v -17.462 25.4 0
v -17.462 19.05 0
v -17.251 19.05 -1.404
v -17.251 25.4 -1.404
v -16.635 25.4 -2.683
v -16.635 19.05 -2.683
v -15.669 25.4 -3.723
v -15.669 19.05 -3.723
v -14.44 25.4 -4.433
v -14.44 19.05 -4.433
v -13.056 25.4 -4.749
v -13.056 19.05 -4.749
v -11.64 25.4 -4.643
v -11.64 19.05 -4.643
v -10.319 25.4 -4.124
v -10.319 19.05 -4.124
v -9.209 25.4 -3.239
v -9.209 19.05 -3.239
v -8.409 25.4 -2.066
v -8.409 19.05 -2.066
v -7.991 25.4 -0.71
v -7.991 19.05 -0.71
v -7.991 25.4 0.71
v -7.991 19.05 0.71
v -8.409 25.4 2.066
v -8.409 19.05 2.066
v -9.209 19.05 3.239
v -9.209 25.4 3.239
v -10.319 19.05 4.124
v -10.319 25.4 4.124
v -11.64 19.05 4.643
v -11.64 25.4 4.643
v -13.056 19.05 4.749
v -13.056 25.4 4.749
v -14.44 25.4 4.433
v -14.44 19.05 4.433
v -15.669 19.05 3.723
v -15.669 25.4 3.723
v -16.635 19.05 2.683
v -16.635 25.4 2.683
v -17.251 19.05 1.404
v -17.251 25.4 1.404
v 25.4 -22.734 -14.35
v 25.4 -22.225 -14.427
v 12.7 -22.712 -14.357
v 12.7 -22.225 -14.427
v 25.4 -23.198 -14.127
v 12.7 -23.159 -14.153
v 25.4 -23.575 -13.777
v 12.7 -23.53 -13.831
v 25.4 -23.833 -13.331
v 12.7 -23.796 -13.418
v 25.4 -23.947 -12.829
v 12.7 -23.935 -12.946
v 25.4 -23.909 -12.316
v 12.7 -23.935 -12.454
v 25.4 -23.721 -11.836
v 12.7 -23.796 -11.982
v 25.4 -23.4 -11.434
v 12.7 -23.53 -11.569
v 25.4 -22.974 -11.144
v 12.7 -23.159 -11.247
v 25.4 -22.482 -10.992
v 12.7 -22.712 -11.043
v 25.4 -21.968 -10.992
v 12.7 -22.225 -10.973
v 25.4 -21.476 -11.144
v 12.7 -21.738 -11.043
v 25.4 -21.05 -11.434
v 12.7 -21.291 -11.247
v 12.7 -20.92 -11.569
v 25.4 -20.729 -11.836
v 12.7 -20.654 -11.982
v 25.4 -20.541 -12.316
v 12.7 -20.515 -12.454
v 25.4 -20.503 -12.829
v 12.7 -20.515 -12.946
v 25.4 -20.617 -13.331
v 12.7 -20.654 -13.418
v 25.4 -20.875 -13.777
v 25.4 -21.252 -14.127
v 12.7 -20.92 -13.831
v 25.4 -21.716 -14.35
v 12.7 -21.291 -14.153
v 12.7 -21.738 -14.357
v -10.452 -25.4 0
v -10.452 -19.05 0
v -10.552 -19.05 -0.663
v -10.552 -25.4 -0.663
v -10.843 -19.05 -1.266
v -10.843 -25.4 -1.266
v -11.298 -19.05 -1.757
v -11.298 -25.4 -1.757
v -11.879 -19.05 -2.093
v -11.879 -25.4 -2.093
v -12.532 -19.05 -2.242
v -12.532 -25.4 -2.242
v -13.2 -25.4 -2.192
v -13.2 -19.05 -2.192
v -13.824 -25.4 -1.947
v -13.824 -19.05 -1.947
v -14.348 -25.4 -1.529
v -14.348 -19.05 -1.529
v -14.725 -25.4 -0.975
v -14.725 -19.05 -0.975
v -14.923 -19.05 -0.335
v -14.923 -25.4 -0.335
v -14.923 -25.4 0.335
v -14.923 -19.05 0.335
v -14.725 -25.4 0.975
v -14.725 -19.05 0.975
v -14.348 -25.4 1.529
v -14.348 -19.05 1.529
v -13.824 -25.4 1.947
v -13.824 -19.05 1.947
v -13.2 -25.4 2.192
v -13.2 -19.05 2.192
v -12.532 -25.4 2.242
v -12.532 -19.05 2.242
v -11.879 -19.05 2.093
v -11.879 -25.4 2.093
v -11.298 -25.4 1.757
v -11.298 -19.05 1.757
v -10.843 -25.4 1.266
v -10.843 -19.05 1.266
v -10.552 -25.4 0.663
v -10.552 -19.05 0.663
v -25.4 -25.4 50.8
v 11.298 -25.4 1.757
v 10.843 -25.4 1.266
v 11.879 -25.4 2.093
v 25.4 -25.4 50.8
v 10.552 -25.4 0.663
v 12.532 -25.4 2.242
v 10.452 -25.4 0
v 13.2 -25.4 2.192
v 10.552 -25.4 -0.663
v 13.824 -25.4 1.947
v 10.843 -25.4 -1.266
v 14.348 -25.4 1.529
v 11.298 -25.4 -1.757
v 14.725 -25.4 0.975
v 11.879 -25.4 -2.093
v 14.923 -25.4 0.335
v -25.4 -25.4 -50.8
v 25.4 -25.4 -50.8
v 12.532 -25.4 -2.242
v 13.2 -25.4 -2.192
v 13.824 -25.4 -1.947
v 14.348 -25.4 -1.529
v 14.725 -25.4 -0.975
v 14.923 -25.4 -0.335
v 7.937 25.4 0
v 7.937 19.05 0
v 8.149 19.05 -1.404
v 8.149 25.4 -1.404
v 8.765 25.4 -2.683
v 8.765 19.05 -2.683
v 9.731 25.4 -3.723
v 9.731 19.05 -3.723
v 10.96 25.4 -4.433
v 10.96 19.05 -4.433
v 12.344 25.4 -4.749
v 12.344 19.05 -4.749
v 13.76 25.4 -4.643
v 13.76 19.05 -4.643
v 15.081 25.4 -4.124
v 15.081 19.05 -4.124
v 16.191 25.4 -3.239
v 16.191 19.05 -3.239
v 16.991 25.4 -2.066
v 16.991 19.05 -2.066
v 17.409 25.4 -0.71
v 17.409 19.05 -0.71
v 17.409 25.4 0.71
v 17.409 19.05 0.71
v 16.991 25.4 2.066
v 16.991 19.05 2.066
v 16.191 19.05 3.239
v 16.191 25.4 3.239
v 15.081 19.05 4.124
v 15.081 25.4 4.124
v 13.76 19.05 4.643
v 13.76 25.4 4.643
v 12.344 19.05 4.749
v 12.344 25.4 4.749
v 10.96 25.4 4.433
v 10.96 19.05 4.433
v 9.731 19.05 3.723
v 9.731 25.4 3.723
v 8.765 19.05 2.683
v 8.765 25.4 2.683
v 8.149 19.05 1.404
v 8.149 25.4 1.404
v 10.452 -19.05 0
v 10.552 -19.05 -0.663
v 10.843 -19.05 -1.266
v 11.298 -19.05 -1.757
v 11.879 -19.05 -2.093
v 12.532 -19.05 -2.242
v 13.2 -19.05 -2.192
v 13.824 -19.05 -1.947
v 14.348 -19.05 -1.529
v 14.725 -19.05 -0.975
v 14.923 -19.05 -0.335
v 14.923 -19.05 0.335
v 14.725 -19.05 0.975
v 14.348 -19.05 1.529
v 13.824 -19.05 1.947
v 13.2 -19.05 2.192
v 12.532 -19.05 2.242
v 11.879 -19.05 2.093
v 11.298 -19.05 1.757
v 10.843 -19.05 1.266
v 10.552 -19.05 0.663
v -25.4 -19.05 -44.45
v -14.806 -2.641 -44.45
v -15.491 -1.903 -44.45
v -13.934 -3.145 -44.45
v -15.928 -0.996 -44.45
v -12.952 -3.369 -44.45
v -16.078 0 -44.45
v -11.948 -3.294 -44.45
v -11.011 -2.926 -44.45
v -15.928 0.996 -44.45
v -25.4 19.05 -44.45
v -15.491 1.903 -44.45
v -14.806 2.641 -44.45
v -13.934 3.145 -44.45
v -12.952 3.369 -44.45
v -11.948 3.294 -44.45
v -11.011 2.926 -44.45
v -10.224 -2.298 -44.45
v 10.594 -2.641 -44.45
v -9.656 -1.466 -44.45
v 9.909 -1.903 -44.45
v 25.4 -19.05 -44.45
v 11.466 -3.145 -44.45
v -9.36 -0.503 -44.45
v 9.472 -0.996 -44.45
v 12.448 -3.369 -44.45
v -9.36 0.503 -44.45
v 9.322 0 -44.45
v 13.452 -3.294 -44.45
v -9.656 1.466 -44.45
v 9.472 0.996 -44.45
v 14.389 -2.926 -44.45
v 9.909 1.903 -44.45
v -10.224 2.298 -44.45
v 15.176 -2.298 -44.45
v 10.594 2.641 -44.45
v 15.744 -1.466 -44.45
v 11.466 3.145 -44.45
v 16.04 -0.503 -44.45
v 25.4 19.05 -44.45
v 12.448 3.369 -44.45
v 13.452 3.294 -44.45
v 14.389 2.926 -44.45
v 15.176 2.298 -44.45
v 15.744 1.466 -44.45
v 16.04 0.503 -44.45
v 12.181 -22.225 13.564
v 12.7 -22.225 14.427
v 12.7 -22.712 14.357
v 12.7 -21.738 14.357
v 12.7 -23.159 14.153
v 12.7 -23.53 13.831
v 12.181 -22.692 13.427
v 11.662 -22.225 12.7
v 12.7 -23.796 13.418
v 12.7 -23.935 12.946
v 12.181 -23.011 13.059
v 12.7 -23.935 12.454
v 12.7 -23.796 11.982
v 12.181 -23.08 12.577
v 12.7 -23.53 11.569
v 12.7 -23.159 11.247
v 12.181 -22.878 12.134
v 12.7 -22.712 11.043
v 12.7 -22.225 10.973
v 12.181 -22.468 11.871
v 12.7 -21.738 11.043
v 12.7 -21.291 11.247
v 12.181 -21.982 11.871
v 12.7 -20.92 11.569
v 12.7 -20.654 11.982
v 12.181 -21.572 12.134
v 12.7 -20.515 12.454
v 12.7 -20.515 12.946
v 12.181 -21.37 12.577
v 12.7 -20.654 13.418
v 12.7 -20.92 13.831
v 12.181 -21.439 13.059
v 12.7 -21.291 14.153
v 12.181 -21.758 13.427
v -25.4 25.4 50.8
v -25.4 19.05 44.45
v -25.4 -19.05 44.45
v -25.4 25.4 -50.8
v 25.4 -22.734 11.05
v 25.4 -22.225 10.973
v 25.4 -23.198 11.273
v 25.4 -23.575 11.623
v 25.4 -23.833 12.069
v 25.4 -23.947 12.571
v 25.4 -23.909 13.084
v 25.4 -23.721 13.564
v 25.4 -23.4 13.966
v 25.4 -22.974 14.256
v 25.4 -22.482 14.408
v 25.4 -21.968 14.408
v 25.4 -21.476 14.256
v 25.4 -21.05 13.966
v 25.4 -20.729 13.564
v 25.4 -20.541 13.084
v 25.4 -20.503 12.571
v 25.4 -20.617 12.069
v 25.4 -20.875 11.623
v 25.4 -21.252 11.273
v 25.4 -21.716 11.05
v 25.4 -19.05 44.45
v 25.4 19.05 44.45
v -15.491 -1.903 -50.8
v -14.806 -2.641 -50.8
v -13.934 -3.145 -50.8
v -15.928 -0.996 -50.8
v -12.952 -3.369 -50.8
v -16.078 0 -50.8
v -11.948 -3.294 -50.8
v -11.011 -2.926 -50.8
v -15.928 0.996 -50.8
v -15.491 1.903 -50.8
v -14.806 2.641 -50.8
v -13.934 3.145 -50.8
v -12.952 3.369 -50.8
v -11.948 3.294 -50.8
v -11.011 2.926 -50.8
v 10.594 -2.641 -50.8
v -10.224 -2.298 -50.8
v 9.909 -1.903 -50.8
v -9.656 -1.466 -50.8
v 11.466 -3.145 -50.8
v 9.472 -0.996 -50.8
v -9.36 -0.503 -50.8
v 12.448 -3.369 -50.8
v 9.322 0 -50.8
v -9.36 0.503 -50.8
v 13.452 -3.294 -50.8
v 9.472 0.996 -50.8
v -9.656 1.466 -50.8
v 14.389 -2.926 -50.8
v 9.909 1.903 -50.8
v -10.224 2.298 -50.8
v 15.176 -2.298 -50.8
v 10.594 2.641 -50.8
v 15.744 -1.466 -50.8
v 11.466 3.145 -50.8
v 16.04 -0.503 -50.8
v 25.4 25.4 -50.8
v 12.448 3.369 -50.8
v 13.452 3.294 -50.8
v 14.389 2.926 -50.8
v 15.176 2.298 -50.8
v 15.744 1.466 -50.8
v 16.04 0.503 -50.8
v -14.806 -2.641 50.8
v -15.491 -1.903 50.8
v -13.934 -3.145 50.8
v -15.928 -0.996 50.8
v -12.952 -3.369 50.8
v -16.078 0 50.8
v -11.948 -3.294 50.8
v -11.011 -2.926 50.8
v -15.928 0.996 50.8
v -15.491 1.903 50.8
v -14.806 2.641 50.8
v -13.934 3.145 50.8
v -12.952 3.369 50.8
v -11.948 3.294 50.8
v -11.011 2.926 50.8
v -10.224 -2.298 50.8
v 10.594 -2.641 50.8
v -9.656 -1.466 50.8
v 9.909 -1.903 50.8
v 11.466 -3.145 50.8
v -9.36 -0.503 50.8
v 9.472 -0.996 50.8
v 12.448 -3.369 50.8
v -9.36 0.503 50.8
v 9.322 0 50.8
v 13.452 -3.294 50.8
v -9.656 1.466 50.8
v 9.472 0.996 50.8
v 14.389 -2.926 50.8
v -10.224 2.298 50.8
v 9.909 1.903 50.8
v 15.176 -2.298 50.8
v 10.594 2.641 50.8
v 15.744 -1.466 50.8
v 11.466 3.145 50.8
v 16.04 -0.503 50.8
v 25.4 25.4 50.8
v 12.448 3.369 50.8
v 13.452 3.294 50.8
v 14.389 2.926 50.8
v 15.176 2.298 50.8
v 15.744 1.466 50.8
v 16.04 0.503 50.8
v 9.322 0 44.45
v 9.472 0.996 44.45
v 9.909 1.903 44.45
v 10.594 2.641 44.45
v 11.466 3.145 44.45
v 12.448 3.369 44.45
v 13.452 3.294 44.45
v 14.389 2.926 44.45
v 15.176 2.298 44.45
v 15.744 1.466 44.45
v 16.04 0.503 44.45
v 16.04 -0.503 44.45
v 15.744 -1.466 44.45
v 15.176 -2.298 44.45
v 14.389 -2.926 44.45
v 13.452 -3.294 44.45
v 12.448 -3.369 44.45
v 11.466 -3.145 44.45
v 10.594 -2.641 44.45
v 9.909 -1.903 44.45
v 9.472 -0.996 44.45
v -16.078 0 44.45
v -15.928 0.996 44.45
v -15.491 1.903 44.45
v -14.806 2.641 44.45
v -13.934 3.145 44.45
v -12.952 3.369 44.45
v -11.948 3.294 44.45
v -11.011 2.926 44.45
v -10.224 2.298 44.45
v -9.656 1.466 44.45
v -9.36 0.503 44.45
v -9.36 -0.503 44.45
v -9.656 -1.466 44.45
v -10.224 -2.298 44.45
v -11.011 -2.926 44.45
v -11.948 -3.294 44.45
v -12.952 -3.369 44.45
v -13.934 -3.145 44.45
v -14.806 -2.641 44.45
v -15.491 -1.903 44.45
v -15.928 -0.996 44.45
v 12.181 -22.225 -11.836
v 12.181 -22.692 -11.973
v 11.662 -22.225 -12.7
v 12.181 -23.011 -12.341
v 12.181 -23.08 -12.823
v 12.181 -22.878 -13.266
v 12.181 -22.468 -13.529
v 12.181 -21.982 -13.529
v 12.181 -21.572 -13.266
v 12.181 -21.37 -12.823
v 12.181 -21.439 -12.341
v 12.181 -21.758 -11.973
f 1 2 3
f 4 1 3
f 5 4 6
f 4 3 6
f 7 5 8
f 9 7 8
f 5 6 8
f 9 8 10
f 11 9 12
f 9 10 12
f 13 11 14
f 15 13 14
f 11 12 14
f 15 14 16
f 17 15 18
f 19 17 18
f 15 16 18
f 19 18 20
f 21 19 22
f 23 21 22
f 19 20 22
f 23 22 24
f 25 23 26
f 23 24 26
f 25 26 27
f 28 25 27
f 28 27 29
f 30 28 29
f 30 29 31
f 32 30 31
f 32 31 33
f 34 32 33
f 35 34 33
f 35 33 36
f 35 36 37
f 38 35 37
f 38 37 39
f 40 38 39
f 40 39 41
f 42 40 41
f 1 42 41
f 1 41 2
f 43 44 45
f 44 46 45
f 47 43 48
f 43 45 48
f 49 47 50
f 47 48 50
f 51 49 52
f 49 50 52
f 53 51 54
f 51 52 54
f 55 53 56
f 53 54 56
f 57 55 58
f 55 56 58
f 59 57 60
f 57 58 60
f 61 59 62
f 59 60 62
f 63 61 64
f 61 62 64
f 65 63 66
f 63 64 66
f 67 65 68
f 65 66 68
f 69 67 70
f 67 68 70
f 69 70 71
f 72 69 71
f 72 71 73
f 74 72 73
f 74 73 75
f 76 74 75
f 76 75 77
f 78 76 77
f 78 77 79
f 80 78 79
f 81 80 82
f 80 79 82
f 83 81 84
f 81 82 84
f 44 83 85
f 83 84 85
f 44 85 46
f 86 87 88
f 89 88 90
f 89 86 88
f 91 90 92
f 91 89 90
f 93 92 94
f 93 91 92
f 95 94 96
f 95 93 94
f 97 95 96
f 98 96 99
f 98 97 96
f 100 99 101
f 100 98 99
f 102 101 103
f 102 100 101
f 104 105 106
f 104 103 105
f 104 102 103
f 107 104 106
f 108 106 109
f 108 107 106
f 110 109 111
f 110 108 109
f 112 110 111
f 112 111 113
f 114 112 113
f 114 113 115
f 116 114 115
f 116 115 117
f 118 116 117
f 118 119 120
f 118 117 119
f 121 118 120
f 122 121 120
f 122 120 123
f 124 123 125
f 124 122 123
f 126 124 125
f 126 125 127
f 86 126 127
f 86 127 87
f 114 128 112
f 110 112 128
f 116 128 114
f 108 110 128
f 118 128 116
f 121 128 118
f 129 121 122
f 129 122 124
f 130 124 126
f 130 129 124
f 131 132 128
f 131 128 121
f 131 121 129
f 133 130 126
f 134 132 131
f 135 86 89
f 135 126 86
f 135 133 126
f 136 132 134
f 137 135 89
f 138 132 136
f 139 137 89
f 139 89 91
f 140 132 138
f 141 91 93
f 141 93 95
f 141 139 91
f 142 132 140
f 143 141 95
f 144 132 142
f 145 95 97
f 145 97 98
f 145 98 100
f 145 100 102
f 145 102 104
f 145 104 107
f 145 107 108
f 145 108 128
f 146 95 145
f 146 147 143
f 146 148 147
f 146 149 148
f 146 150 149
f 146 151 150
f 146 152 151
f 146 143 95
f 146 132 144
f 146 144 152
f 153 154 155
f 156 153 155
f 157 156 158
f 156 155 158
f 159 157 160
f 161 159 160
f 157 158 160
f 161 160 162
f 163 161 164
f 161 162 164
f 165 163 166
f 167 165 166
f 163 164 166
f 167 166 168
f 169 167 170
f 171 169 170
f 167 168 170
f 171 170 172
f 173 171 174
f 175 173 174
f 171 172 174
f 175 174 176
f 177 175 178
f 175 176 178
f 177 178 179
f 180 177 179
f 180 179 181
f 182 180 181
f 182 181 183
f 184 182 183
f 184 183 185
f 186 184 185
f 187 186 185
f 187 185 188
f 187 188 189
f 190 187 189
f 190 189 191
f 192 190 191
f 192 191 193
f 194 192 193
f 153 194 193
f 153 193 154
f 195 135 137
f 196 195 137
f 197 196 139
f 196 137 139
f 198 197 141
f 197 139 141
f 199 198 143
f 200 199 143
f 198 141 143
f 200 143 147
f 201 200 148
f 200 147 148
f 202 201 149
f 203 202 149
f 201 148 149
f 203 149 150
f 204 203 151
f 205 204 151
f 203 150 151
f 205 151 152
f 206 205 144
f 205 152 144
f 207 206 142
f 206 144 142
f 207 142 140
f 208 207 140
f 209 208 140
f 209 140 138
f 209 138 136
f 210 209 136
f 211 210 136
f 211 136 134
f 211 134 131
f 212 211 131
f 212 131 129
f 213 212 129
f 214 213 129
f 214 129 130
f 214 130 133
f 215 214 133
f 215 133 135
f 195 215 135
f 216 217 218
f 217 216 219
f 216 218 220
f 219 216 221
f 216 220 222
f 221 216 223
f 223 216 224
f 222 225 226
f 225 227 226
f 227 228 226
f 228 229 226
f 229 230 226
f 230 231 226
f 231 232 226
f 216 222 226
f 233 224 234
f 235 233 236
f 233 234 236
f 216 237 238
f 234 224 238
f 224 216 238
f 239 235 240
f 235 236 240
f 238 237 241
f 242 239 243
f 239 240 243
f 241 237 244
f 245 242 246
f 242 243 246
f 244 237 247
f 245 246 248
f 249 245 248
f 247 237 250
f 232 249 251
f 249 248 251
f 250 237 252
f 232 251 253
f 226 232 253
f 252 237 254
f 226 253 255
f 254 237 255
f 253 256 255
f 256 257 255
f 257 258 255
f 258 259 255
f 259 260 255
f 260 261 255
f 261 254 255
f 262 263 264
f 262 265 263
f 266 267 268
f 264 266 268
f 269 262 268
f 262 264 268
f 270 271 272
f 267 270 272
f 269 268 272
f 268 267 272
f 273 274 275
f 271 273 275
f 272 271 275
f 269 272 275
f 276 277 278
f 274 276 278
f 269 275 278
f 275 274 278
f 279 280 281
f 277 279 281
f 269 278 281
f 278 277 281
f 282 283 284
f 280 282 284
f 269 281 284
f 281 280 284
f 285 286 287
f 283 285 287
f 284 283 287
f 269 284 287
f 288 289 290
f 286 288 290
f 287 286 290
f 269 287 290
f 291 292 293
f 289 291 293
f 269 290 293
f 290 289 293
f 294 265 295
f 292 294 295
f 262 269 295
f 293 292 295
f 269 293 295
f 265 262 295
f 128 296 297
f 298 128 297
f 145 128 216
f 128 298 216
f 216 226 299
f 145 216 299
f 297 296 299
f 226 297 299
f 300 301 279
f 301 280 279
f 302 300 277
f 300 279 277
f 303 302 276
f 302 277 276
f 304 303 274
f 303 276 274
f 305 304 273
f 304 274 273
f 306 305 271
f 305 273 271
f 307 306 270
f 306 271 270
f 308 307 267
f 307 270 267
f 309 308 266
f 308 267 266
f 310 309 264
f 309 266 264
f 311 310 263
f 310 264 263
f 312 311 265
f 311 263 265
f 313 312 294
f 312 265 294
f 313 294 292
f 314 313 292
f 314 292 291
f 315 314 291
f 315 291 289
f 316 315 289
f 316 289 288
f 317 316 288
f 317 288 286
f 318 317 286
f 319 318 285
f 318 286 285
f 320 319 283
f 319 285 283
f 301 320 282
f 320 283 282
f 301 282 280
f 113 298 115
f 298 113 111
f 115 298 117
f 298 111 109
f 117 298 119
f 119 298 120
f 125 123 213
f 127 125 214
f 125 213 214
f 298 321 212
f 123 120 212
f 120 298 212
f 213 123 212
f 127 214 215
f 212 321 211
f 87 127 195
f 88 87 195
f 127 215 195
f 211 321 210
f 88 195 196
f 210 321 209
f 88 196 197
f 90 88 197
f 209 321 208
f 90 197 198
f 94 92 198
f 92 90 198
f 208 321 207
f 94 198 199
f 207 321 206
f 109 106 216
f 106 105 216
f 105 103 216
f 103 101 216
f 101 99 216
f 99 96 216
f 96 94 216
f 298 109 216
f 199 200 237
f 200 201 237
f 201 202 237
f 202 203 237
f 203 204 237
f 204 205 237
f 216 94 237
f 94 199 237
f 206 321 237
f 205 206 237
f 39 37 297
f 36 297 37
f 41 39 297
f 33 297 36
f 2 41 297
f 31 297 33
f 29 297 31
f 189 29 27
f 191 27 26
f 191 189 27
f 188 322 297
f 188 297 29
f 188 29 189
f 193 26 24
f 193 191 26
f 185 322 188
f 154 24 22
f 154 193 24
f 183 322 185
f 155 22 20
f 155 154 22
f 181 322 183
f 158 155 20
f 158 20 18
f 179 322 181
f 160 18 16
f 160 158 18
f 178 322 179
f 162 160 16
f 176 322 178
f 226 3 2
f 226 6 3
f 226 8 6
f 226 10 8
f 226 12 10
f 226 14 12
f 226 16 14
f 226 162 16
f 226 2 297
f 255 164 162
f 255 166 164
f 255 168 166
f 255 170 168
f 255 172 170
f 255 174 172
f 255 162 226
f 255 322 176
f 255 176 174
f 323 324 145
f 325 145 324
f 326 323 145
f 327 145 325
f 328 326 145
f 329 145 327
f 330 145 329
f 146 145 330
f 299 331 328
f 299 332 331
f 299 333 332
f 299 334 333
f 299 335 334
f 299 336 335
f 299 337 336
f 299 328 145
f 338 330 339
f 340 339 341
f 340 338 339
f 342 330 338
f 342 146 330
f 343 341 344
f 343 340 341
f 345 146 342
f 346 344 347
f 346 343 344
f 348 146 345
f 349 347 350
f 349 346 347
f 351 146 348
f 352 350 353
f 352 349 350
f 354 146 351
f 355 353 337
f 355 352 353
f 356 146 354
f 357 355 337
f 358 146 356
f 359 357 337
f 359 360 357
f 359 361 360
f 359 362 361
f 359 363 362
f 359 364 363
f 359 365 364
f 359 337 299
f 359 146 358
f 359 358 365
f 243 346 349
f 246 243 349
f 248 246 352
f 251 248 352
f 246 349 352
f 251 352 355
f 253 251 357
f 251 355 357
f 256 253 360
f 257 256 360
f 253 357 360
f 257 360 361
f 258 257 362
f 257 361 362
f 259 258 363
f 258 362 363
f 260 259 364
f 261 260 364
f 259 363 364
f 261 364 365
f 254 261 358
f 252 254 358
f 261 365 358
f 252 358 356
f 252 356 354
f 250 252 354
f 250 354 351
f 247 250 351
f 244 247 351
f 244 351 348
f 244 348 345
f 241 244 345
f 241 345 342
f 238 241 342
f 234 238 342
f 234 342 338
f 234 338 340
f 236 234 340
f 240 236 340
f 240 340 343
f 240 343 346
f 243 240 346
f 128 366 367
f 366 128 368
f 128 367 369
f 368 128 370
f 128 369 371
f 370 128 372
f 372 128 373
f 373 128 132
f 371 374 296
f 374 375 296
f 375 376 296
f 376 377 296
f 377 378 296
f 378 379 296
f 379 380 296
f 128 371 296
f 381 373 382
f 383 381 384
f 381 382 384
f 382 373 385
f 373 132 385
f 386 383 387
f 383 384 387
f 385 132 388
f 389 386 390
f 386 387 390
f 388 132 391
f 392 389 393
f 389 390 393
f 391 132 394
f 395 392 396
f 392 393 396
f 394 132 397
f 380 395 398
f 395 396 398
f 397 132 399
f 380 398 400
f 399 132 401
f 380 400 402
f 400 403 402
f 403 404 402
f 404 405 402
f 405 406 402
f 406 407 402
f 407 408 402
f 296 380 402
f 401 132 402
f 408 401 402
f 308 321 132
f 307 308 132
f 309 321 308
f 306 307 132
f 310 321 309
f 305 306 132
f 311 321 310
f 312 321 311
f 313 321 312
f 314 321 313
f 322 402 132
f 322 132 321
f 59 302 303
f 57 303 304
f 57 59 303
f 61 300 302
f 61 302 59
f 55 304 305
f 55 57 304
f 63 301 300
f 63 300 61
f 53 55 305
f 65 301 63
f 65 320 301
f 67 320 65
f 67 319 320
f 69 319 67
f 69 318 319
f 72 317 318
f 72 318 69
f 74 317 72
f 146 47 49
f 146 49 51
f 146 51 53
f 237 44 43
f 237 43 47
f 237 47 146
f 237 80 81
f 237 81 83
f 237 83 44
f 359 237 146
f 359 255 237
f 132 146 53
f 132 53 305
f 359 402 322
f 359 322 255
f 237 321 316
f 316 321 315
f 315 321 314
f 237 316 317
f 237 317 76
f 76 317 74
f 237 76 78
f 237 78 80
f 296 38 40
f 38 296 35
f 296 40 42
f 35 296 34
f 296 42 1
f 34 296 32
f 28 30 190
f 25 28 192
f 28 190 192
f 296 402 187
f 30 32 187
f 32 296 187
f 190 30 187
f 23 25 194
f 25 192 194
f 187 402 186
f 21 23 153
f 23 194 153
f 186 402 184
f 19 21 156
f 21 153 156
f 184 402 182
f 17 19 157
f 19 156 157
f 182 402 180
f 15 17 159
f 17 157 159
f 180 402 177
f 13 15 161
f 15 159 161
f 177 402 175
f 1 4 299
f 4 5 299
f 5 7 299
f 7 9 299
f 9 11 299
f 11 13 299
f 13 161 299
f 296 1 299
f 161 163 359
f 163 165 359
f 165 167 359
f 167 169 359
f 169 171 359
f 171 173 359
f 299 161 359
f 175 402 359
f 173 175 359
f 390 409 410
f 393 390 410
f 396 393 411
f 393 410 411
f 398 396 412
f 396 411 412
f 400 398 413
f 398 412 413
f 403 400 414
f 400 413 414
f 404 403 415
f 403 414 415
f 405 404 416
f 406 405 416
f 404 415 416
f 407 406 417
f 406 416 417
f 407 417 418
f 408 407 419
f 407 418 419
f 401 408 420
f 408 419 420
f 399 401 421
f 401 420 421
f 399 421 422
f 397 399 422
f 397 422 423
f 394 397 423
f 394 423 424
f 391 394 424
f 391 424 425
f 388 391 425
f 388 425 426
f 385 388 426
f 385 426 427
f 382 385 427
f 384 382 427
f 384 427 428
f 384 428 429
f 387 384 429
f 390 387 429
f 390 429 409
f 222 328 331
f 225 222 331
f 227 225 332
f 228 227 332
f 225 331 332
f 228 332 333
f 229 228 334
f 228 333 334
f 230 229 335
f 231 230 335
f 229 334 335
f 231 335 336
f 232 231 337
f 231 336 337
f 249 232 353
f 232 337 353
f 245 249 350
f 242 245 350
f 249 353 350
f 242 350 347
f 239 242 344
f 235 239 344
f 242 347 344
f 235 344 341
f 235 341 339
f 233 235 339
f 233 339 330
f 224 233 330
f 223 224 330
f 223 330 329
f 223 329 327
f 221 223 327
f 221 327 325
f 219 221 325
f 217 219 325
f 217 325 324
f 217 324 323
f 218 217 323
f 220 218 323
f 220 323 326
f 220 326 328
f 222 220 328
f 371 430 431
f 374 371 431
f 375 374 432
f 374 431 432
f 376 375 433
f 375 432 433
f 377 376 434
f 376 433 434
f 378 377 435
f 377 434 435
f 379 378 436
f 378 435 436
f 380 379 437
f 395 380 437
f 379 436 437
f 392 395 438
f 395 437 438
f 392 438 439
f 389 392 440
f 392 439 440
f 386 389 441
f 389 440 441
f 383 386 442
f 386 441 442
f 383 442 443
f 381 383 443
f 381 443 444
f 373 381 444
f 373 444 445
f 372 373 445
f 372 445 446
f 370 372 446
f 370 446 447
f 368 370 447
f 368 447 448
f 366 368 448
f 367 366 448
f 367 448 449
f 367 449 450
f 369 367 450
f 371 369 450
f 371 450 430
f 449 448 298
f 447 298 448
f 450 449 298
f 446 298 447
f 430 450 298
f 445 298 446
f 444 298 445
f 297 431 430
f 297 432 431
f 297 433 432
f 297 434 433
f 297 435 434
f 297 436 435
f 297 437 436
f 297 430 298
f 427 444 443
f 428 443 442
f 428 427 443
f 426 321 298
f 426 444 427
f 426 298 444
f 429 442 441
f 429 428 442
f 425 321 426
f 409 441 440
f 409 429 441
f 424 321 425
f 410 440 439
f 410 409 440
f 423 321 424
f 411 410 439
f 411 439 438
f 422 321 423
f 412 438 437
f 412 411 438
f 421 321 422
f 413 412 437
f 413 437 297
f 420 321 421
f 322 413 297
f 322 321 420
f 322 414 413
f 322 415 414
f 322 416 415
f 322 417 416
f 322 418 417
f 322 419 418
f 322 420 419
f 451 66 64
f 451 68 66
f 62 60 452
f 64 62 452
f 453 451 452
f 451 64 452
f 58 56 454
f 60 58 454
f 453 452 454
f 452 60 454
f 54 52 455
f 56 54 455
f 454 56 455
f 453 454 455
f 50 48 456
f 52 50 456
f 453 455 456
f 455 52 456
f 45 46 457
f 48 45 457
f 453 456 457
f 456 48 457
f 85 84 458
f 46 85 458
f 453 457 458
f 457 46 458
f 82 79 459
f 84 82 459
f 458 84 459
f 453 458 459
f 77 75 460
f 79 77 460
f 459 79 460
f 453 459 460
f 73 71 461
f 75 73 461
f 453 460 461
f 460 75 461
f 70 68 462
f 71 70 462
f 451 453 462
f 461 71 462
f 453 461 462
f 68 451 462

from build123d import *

# Parameters (mm, degrees)
SKETCH2_W                        = 101.6
SKETCH2_H                        = 50.8
SKETCH2_W_2                      = 88.9
SKETCH2_H_2                      = 38.1
BOSS_EXTRUDE1_DEPTH              = 25.4
F_1_4_CLEARANCE_HOLE1_D          = 6.7564
F_8_CLEARANCE_HOLE1_D            = 4.4958
F_8_CLEARANCE_HOLE1_DEPTH        = 6.35
F_3_8_0_375_DIAMETER_HOLE1_D     = 9.525
F_3_8_0_375_DIAMETER_HOLE1_DEPTH = 6.35
F_8_32_TAPPED_HOLE1_D            = 3.4544
F_8_32_TAPPED_HOLE1_DEPTH        = 12.7
F_8_32_TAPPED_HOLE1_TIP          = 1.037806461


with BuildPart() as part:
    # Sketch2 → Boss-Extrude1 (new body, symmetric)
    with BuildSketch(Plane(origin=(0, 0, 0), x_dir=(0, 0, -1), z_dir=(1, 0, 0))):
        Rectangle(SKETCH2_W, SKETCH2_H)
        Rectangle(SKETCH2_W_2, SKETCH2_H_2, mode=Mode.SUBTRACT)
    extrude(amount=BOSS_EXTRUDE1_DEPTH, both=True)

    # 1/4 Clearance Hole1 (through all)
    with Locations(Plane.XY.offset(50.8)):
        with Locations((-12.7, 0), (12.7, 0)):
            Hole(F_1_4_CLEARANCE_HOLE1_D / 2)

    # #8 Clearance Hole1
    with Locations(Plane(origin=(0, -19.05, 0), x_dir=(1, 0, 0), z_dir=(0, 1, 0))):
        with Locations((12.7, 0)):
            f_8_clearance_hole1 = Hole(F_8_CLEARANCE_HOLE1_D / 2, depth=F_8_CLEARANCE_HOLE1_DEPTH)

    # Mirror1: #8 Clearance Hole1 across plane
    add(f_8_clearance_hole1.mirror(Plane(origin=(0, 0, 0), x_dir=(0, 0, 1), z_dir=(1, 0, 0))), mode=Mode.SUBTRACT)

    # 3/8 (0.375) Diameter Hole1
    with Locations(Plane(origin=(0, 25.4, 0), x_dir=(1, 0, 0), z_dir=(0, 1, 0))):
        with Locations((-12.7, 0), (12.7, 0)):
            Hole(F_3_8_0_375_DIAMETER_HOLE1_D / 2, depth=F_3_8_0_375_DIAMETER_HOLE1_DEPTH)

    # #8-32 Tapped Hole1
    with Locations(Plane(origin=(25.4, 0, 0), x_dir=(0, 0, 1), z_dir=(1, 0, 0))):
        with Locations((-12.7, 22.225), (12.7, 22.225)):
            Hole(F_8_32_TAPPED_HOLE1_D / 2, depth=F_8_32_TAPPED_HOLE1_DEPTH)
            with Locations((0, 0, -(F_8_32_TAPPED_HOLE1_DEPTH + F_8_32_TAPPED_HOLE1_TIP / 2))):  # 118° drill point
                Cone(0, F_8_32_TAPPED_HOLE1_D / 2, F_8_32_TAPPED_HOLE1_TIP, mode=Mode.SUBTRACT)


solid = part.part
